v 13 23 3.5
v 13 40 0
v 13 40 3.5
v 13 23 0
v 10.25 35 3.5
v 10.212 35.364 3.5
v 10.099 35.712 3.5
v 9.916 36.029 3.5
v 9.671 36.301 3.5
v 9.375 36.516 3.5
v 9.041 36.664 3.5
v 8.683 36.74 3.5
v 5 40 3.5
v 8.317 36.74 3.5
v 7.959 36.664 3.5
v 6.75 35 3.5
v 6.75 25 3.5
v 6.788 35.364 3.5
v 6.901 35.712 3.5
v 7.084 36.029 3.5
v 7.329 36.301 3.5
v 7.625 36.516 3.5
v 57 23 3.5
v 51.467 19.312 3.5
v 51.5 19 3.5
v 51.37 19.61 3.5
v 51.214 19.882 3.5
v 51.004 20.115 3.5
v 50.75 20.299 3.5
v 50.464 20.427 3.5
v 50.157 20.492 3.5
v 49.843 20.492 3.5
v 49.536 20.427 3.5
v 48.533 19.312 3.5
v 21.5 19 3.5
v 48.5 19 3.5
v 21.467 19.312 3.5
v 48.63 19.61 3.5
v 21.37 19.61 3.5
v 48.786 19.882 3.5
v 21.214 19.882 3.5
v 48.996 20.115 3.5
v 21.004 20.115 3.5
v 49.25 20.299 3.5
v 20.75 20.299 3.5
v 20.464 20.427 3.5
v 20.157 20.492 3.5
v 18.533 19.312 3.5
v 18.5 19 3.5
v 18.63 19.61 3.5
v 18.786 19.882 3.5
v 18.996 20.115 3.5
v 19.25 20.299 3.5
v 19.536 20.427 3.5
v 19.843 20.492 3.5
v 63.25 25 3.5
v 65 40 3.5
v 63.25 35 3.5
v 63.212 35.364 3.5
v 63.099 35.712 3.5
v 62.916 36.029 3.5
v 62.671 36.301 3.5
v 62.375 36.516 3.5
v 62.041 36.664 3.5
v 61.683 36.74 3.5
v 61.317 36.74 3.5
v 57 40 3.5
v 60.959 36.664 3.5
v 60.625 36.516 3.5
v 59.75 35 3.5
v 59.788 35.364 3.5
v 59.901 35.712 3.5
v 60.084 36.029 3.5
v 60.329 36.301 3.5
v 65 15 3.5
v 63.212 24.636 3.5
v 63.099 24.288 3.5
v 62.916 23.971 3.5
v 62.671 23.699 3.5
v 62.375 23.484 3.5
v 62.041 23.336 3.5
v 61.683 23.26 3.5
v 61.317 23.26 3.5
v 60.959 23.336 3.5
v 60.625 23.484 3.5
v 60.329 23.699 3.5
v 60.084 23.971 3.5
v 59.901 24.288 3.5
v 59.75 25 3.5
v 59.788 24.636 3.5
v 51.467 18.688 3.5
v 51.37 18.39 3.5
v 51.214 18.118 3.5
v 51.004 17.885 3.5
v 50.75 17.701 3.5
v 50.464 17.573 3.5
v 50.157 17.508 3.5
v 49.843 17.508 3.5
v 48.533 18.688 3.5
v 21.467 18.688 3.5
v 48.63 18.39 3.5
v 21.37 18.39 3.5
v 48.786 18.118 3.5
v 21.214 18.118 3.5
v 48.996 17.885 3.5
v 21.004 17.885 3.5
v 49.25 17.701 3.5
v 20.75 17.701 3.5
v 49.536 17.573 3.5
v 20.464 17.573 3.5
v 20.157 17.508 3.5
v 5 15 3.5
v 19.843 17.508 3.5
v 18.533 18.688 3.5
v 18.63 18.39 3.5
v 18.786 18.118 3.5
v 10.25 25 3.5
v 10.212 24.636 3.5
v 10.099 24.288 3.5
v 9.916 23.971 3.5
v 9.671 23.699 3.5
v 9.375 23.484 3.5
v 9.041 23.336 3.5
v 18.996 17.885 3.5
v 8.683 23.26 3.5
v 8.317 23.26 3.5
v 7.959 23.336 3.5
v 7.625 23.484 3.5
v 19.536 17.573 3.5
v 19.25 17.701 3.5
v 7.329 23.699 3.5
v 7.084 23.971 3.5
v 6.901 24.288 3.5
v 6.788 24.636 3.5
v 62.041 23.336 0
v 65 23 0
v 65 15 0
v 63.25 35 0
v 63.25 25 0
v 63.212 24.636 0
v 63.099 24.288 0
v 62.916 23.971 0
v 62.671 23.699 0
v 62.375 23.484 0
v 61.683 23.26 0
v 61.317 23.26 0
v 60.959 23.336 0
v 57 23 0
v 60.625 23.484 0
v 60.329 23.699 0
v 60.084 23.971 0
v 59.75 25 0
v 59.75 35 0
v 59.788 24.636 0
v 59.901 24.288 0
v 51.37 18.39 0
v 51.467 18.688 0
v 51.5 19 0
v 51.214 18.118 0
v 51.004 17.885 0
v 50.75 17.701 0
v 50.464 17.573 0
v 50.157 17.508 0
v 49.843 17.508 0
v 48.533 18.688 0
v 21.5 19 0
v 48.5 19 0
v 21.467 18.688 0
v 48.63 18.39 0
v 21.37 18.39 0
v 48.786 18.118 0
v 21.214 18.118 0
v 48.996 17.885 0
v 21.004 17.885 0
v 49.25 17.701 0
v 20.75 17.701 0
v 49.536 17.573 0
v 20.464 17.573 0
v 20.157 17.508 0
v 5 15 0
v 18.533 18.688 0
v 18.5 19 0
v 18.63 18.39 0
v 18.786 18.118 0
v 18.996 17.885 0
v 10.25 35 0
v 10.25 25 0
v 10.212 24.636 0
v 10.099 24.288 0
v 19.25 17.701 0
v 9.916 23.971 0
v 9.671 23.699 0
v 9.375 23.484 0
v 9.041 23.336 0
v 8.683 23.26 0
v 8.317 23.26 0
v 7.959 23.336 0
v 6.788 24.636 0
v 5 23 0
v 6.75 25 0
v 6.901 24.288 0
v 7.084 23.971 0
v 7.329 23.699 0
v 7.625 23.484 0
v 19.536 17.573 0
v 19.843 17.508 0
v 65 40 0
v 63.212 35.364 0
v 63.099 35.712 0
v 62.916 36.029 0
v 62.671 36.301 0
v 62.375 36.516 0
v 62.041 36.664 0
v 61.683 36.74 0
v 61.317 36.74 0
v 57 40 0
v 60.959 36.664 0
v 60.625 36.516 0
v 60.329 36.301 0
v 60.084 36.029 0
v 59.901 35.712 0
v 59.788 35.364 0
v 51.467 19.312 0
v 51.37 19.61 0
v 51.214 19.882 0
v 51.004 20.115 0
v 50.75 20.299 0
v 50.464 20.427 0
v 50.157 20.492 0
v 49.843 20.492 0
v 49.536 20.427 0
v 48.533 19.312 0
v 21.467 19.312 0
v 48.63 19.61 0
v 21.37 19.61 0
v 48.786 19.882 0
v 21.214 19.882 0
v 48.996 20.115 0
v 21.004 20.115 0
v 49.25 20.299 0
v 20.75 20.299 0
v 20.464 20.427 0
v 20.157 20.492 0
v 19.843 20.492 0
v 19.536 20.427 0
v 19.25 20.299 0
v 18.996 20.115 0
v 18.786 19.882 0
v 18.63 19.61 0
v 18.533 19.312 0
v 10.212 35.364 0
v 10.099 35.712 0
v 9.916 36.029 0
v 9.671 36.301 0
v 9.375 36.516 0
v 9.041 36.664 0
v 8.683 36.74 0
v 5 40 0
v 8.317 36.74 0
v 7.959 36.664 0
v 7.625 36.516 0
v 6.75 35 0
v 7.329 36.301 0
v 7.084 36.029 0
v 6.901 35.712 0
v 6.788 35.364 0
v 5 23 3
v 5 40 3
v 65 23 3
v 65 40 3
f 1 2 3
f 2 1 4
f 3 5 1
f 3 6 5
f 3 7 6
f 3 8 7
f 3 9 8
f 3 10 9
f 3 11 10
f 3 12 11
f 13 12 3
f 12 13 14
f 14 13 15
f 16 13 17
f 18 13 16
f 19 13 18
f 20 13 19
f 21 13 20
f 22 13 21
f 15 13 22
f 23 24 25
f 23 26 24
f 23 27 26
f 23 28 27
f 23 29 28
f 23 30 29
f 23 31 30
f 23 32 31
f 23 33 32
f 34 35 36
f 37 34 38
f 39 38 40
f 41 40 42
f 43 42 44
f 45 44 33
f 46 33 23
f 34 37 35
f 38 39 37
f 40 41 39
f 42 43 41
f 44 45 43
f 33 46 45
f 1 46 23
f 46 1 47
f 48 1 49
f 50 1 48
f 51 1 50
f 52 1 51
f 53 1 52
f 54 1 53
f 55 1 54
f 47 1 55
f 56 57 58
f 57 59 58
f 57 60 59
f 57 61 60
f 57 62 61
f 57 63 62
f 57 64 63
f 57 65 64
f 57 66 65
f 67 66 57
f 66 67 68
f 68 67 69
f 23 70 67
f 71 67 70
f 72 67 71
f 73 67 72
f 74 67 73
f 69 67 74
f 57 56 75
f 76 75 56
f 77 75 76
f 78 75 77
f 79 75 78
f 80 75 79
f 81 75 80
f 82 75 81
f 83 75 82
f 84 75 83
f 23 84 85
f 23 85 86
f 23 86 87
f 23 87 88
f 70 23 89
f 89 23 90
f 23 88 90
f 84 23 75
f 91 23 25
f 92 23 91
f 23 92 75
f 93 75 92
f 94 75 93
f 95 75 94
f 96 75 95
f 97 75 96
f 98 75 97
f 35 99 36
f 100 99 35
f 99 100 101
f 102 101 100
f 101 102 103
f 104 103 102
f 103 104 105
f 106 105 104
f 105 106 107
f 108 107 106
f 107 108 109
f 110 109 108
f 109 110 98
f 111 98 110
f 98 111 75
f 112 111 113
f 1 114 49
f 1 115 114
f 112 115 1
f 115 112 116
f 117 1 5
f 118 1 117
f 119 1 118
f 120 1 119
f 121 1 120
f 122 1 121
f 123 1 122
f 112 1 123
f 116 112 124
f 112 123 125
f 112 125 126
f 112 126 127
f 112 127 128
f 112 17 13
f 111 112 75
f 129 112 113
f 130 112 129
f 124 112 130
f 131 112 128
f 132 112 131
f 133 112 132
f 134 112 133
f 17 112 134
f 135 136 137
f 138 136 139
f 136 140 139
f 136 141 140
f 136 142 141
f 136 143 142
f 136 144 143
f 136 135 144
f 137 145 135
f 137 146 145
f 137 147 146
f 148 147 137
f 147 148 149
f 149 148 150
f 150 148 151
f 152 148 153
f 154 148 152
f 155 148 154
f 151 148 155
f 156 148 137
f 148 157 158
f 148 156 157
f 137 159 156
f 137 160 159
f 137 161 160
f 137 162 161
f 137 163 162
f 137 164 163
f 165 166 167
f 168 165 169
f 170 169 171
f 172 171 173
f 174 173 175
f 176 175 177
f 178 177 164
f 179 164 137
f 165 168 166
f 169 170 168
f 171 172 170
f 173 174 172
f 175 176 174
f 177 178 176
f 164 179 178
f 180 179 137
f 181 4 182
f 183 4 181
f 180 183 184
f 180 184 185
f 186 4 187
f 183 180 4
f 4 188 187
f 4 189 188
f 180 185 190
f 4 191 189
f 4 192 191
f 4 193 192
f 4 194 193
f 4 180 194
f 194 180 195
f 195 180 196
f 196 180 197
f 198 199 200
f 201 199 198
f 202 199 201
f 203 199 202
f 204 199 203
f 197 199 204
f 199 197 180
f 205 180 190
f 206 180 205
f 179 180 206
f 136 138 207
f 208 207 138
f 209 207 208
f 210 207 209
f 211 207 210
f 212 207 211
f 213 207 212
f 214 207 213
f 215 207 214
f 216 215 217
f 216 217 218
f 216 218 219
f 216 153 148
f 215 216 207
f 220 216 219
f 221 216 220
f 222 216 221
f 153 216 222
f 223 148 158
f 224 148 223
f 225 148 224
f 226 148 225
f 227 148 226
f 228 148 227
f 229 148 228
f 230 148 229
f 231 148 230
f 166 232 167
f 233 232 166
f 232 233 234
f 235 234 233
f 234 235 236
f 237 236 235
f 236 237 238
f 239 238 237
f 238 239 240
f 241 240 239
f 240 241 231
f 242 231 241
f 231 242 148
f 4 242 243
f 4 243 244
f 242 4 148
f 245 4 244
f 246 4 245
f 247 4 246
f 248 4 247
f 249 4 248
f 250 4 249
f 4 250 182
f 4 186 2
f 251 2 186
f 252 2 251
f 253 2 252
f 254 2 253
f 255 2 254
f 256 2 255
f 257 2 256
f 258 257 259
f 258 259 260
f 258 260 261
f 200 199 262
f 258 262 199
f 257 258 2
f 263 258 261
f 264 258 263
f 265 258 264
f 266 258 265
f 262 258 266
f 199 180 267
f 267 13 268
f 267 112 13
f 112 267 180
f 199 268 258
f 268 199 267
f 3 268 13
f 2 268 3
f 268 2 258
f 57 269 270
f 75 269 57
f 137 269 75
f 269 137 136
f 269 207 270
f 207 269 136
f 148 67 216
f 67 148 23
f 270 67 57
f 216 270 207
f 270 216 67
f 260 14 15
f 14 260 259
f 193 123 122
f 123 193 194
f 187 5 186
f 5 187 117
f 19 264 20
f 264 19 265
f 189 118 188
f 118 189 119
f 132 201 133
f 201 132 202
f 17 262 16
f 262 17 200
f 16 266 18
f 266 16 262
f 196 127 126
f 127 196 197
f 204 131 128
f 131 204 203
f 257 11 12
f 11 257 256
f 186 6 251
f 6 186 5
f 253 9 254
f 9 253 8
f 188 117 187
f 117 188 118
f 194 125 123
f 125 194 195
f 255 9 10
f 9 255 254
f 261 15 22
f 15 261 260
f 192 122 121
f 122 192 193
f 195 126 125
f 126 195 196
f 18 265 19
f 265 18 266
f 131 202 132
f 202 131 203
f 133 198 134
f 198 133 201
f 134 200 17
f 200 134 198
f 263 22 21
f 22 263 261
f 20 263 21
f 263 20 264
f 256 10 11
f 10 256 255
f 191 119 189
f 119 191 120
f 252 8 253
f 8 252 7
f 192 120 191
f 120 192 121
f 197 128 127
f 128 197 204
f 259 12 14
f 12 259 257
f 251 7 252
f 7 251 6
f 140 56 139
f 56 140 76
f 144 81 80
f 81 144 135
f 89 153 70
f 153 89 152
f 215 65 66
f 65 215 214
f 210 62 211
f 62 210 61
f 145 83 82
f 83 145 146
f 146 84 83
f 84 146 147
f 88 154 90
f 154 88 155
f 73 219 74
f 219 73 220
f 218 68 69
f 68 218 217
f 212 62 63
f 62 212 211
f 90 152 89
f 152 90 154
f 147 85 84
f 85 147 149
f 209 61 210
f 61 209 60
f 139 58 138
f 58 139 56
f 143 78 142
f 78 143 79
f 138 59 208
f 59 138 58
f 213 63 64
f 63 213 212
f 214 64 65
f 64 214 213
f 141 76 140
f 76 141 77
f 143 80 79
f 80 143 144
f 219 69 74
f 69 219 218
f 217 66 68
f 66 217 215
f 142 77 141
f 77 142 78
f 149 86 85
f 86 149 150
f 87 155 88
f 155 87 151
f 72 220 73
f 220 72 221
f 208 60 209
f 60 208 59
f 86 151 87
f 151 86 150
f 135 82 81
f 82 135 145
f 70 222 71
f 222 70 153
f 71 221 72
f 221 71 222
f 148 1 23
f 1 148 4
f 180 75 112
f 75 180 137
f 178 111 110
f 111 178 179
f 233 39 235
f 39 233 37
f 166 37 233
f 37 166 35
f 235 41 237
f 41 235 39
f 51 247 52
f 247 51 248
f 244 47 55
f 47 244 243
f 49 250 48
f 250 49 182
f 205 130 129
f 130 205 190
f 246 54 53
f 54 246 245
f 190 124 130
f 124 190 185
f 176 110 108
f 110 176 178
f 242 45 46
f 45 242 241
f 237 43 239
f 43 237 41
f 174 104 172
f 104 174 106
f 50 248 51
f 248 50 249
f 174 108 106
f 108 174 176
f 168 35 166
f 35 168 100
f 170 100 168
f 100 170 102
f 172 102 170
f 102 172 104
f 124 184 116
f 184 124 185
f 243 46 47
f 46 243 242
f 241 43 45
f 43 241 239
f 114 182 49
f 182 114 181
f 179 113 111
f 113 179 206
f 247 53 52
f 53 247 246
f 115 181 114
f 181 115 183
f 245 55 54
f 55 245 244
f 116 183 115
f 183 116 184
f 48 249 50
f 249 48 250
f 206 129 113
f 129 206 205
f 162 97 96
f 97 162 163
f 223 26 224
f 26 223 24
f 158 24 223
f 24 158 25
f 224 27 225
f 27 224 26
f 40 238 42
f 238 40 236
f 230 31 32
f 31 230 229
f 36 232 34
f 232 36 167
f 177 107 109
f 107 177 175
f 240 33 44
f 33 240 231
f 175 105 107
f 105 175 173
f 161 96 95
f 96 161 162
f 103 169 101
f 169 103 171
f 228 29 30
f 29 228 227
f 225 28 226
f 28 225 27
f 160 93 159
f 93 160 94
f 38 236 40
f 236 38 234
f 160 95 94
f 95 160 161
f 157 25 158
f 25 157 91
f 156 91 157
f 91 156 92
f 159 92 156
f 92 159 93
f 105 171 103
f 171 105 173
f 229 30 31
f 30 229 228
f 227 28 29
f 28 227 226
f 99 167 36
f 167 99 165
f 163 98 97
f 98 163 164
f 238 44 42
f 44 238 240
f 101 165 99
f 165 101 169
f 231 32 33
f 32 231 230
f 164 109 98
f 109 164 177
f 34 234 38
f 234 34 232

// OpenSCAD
$fn=30;

difference()
{
	union()
	{
		translate([5,0,0]) cube([8,40,3.5]);
		translate([57,0,0]) cube([8,40,3.5]);
	}
	hull()
	{
		translate([8.5,35,-1]) cylinder(d=3.5,h=6);
		translate([8.5,25,-1]) cylinder(d=3.5,h=6);
	}
	hull()
	{
		translate([61.5,35,-1]) cylinder(d=3.5,h=6);
		translate([61.5,25,-1]) cylinder(d=3.5,h=6);
	}

	translate([-1,-1,-1]) cube([72,20,6]);
	translate ([14,34,-1]) cube([42,26,4]);
	translate ([-1,-1,-1]) cube([6,50,4]);
	translate ([65,-1,-1]) cube([6,50,4]);
}
difference()
	{
	translate ([5,15,0]) cube([60,8,3.5]);
	translate ([20,19,-1]) cylinder(d=3,h=6);
	translate ([50,19,-1]) cylinder(d=3,h=6);
//	translate ([20,21,5]) rotate ([90,0,0]) cylinder(d=4,h=7);
//	translate ([50,21,5]) rotate ([90,0,0]) cylinder(d=4,h=7);
	}
